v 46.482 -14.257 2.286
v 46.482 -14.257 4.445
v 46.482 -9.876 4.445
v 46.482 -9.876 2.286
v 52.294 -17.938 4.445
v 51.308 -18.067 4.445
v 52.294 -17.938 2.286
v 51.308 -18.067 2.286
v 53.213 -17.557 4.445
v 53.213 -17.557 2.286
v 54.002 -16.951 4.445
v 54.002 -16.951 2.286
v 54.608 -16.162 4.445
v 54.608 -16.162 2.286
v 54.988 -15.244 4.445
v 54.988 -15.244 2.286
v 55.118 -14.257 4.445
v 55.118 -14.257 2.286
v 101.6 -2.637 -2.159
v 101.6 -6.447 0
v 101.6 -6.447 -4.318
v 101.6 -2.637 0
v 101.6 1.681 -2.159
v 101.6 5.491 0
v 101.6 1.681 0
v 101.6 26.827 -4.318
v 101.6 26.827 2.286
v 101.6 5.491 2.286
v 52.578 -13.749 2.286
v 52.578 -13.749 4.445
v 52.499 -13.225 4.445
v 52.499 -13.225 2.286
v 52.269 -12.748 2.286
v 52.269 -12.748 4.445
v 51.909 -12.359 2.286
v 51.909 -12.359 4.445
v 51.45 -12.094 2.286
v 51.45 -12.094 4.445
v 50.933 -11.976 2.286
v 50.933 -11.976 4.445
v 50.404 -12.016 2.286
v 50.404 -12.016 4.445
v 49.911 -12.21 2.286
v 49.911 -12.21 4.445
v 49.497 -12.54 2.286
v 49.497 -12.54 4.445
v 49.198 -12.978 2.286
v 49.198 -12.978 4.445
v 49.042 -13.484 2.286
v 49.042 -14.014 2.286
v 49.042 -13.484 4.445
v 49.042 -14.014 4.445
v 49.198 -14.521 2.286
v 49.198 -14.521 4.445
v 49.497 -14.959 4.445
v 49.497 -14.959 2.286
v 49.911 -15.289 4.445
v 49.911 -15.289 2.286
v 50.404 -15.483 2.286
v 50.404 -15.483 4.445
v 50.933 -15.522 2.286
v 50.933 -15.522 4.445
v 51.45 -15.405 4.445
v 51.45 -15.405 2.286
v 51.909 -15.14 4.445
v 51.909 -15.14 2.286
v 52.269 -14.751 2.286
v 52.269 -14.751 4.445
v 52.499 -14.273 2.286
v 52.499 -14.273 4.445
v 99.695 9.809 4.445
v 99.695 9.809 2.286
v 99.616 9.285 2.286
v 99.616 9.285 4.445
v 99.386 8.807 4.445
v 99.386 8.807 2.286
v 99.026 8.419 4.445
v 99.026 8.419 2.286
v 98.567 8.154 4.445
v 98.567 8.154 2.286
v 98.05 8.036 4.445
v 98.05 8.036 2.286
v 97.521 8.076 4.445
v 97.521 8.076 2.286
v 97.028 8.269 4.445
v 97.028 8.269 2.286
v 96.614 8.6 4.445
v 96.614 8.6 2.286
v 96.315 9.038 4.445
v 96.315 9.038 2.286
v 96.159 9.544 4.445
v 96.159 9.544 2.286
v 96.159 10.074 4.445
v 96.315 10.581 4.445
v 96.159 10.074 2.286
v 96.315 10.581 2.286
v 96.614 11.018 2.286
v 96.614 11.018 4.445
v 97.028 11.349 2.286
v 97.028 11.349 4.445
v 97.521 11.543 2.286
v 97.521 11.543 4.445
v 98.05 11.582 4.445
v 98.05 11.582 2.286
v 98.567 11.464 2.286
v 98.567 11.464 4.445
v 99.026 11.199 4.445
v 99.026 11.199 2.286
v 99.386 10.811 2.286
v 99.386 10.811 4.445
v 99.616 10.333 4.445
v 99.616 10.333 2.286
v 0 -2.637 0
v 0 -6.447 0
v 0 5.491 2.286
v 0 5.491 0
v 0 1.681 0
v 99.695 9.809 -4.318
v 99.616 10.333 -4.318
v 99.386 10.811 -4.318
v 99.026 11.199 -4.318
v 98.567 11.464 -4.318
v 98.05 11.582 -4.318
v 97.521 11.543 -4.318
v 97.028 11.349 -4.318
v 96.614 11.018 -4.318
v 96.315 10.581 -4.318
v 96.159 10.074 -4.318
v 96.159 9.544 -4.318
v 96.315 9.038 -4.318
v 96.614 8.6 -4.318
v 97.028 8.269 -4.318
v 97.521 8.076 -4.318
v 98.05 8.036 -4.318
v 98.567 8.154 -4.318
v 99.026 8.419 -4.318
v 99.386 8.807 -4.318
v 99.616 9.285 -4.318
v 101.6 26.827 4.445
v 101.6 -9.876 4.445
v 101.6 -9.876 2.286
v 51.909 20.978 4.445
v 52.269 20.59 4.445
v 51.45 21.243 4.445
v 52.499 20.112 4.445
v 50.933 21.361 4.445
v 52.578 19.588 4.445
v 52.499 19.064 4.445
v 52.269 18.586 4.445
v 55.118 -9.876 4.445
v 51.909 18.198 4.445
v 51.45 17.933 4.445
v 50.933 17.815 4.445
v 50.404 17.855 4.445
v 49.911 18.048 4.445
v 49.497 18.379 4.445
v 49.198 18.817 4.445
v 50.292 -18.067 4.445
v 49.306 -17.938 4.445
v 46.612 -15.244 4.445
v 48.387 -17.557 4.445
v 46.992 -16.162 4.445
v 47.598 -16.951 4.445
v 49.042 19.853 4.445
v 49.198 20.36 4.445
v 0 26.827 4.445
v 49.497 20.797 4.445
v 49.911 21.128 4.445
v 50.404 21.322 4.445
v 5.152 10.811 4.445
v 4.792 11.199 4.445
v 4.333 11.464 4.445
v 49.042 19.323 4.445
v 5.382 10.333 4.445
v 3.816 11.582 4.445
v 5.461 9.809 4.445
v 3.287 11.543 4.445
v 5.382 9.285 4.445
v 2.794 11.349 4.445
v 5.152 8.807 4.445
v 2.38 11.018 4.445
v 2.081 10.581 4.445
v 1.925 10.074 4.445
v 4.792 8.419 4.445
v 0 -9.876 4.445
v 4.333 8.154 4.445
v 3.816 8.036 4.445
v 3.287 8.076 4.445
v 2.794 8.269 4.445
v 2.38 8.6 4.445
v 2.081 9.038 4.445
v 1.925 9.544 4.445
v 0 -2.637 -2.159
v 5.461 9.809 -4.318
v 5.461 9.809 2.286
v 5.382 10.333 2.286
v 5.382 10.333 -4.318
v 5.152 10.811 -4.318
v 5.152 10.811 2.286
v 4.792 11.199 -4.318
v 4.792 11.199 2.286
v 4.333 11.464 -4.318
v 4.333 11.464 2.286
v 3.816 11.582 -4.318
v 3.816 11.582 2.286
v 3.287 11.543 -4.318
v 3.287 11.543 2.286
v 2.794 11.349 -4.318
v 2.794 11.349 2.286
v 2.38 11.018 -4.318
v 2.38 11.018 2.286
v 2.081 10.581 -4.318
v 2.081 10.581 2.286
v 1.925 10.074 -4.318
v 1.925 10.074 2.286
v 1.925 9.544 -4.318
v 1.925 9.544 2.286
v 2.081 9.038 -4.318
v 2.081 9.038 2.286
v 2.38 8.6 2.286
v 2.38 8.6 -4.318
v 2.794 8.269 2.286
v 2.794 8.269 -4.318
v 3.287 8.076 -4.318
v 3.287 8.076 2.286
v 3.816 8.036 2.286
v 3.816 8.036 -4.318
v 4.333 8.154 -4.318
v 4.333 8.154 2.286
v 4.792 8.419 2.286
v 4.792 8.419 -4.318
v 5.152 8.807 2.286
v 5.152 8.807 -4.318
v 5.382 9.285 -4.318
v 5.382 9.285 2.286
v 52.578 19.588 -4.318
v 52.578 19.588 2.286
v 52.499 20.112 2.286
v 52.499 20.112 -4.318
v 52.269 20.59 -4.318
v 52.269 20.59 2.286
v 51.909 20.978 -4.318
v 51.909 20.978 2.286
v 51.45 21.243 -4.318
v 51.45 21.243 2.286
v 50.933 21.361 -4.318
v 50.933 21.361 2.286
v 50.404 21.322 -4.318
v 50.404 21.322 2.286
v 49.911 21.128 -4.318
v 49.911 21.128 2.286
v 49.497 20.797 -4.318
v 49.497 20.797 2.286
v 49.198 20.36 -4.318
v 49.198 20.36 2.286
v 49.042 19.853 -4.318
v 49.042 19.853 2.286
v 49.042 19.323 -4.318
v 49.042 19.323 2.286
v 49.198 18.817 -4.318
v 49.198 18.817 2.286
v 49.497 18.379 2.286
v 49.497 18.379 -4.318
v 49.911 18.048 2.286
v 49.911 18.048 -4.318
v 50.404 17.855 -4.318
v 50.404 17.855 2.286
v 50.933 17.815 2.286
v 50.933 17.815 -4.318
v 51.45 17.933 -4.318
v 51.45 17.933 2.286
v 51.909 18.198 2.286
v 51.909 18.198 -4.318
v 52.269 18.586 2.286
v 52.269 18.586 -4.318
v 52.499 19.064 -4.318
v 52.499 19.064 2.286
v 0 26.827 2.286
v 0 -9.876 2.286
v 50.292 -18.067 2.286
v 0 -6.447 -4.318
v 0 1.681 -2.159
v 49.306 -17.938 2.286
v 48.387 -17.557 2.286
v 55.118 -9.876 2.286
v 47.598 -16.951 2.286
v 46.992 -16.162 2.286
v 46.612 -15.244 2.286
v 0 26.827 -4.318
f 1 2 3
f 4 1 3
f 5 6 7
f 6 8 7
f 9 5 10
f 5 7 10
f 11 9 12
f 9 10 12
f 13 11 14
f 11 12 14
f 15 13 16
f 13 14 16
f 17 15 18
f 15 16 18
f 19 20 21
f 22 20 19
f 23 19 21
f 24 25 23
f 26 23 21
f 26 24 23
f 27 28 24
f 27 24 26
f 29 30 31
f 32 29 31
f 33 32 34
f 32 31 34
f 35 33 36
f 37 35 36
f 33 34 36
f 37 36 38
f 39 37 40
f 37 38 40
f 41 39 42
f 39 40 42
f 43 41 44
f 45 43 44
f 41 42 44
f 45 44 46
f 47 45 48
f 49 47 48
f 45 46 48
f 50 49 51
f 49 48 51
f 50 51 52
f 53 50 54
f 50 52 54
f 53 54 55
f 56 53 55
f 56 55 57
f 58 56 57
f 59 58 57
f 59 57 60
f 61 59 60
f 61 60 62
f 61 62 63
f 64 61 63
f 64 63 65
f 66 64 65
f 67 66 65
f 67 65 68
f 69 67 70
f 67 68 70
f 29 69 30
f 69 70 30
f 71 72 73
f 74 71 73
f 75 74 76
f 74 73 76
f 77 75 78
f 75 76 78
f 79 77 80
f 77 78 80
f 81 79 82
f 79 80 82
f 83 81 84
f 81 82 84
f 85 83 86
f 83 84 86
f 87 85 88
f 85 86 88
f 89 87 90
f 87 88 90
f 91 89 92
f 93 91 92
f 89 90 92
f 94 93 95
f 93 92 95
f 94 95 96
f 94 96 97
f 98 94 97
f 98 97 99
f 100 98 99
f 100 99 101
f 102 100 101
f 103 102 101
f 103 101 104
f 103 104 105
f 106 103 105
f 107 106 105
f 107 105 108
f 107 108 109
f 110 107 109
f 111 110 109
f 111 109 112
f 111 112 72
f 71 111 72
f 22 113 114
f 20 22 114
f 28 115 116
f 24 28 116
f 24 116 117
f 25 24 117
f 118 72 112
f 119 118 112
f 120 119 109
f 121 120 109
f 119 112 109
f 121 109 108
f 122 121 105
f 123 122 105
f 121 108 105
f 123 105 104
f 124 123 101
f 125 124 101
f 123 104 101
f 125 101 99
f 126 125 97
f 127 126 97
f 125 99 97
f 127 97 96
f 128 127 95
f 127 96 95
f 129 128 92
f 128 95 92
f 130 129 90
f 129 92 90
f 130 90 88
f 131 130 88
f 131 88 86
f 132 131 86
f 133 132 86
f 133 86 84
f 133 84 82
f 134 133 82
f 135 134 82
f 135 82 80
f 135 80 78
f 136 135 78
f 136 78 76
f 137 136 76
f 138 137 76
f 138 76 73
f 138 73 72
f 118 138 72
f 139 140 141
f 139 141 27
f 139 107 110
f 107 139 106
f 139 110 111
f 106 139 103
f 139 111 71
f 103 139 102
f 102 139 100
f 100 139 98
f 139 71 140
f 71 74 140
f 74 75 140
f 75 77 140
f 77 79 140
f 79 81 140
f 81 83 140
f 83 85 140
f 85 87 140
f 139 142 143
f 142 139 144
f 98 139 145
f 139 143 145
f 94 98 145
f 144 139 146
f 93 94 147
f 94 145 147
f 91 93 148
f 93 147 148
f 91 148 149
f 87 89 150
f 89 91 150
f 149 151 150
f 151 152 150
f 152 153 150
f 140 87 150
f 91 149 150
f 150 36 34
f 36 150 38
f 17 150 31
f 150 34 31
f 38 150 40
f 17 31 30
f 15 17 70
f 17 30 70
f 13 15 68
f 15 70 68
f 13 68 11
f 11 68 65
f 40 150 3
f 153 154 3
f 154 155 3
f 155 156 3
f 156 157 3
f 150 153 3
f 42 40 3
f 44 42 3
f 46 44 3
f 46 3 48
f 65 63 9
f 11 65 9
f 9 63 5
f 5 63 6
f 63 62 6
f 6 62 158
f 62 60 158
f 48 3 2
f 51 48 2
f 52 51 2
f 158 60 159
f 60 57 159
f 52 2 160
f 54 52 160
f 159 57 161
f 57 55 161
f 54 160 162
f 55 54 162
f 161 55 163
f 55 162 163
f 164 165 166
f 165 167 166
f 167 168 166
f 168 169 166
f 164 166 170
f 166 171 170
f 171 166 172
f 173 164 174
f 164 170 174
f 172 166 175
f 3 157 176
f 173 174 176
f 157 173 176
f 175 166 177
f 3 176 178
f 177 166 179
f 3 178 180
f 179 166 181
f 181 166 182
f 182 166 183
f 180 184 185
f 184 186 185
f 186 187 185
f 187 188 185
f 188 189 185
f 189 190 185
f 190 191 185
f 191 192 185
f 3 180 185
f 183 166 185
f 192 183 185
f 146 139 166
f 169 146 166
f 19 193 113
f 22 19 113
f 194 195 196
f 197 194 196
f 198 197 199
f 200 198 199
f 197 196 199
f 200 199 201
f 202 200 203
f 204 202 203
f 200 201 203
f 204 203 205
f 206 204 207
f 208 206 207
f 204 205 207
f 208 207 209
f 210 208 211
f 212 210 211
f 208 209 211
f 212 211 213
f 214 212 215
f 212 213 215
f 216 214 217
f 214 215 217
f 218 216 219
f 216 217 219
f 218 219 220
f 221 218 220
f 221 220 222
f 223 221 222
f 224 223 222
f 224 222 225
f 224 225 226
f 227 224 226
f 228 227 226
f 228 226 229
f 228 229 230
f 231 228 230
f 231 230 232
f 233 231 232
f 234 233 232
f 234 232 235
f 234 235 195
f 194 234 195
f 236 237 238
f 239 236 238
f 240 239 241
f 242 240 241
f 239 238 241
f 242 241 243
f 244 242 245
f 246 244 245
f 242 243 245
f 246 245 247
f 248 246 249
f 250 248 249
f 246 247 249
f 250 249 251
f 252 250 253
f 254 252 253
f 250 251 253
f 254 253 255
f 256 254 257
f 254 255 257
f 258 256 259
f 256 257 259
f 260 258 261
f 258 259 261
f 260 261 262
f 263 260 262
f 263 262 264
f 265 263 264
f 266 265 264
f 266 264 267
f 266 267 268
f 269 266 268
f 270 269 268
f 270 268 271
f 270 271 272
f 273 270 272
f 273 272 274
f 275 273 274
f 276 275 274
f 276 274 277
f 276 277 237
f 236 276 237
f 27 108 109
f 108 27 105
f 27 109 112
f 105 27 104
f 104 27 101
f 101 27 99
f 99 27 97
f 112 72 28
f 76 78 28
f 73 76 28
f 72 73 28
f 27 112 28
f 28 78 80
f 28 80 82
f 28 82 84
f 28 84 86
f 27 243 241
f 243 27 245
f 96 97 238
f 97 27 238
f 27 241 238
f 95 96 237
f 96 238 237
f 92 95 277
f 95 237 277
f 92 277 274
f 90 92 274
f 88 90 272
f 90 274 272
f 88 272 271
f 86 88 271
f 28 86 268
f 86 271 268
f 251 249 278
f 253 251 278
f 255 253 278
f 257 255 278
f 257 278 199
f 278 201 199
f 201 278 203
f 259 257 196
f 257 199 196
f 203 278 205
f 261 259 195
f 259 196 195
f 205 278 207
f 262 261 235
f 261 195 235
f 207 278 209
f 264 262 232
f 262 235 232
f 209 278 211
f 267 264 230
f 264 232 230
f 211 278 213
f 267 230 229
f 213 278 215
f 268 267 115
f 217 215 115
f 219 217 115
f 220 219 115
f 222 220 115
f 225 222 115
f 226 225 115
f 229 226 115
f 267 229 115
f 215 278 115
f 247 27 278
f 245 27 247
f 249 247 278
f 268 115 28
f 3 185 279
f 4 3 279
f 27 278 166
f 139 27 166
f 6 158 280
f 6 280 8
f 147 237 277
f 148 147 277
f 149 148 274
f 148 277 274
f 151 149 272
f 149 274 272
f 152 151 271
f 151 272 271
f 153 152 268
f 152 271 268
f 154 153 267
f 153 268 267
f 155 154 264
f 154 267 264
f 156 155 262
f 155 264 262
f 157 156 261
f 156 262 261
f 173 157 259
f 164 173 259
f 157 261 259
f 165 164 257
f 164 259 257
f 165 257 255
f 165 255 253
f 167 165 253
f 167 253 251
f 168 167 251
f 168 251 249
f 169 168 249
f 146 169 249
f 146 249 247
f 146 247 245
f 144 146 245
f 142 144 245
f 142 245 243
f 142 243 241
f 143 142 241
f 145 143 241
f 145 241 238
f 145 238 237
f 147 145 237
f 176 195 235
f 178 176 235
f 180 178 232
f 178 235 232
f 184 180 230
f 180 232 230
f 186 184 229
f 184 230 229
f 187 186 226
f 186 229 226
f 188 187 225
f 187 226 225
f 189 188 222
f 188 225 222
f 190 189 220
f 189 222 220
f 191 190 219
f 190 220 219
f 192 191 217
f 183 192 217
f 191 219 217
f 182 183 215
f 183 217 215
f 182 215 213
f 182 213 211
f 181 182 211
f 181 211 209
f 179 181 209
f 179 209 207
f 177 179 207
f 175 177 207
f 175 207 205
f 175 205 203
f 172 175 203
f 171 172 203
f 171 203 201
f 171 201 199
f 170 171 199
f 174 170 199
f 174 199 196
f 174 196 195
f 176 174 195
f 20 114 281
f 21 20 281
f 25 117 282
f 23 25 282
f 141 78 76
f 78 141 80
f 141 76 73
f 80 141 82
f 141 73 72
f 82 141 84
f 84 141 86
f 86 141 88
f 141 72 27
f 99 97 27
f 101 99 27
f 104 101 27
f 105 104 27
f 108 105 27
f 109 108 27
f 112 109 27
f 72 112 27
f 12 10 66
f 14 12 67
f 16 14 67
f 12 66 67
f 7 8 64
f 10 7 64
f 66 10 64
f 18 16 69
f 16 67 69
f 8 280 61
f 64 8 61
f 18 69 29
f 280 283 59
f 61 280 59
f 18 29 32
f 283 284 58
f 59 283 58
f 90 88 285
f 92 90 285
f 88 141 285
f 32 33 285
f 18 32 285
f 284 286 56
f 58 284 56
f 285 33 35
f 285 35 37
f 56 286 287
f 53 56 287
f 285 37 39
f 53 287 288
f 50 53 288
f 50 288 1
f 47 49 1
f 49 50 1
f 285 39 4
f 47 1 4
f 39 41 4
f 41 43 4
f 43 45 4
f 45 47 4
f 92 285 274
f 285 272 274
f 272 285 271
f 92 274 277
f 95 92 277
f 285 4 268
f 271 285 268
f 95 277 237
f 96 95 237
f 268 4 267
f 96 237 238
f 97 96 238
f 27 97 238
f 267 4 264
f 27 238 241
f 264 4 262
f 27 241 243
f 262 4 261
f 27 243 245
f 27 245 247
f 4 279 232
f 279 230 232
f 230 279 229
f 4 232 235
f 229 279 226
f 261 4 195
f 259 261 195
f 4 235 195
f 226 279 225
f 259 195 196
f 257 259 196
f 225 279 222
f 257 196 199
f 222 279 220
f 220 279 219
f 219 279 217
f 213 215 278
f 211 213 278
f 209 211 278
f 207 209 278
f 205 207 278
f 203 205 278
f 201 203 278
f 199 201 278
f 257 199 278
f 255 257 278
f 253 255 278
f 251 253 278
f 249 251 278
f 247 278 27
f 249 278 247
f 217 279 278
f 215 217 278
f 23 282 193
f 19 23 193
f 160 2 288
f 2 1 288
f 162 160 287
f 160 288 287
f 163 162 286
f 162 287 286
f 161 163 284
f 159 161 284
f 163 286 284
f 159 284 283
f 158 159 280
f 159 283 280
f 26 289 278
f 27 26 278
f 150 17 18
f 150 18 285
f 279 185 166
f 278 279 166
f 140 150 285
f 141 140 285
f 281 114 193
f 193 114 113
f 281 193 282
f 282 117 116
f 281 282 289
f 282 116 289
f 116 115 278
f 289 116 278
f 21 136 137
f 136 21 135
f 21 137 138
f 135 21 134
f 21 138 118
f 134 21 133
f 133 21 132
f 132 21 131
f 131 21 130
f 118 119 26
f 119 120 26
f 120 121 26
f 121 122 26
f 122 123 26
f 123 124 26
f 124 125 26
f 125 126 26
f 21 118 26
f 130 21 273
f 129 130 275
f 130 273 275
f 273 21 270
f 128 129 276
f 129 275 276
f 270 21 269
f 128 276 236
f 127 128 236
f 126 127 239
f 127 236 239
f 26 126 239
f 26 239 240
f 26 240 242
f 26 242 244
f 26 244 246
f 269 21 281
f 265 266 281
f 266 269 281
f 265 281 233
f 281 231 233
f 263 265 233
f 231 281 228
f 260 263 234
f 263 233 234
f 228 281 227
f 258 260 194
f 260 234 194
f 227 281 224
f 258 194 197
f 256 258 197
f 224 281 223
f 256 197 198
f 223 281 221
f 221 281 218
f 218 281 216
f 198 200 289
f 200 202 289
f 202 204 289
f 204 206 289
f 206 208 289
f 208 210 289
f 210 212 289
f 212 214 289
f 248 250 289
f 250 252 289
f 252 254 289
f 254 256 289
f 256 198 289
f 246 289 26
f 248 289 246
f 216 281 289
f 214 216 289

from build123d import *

# Parameters (mm, degrees)
F1_DEPTH = 101.6
F2_R     = 1.778
F3_DEPTH = 6.605
F5_DEPTH = 101.6
F6_R     = 1.778
F7_DEPTH = 2.16
F8_W     = 8.636
F8_H     = 8.1915
F8_R     = 1.778
F9_DEPTH = 2.159
F10_R    = 3.81


with BuildPart() as f1:
    # F0 (on Right) → F1 (new body)
    with BuildSketch(Plane.YZ):
        Polygon((-6.446921, 0), (-6.446921, -4.318), (26.827079, -4.318), (26.827079, 0), (26.827079, 2.286), (5.491079, 2.286), (5.491079, 0), (1.681079, 0), (1.681079, -2.159), (-2.636921, -2.159), (-2.636921, 0), align=None)
    extrude(amount=F1_DEPTH)

    # F2 (on face) → F3 (cut, through all)
    with BuildSketch(Plane.XY.offset(2.286)):
        with Locations((97.917, 9.809079)):
            Circle(F2_R)
        with Locations((3.683, 9.809079)):
            Circle(F2_R)
        with Locations((50.8, 19.588079)):
            Circle(F2_R)
    extrude(amount=-F3_DEPTH, mode=Mode.SUBTRACT)


with BuildPart() as f5:
    # F4 (on Right) → F5 (new body, through all)
    with BuildSketch(Plane.YZ):
        Polygon((-9.875921, 4.445), (-9.875921, 2.286), (5.491079, 2.286), (26.827079, 2.286), (26.827079, 4.445), align=None)
    extrude(amount=F5_DEPTH)

    # F6 (on face) → F7 (cut, through all)
    with BuildSketch(Plane(origin=(0, 0, 2.286), x_dir=(1, 0, 0), z_dir=(0, 0, -1))):
        with Locations((97.917, -9.809079)):
            Circle(F6_R)
        with Locations((3.683, -9.809079)):
            Circle(F6_R)
        with Locations((50.8, -19.588079)):
            Circle(F6_R)
    extrude(amount=-F7_DEPTH, mode=Mode.SUBTRACT)

    # F8 (on face) → F9 (join, through all)
    with BuildSketch(Plane.XY.offset(4.445)):
        with Locations((50.8, -13.971671)):
            Rectangle(F8_W, F8_H)
        with Locations((50.8, -13.749421)):
            Circle(F8_R, mode=Mode.SUBTRACT)
    extrude(amount=-F9_DEPTH)

    # F10
    f10_edges = [f5.edges().sort_by_distance(p)[0] for p in [
        (55.118, -18.067421, 3.3655),
        (46.482, -18.067421, 3.3655),
    ]]
    fillet(f10_edges, radius=F10_R)


solid = Compound([f1.part, f5.part])
